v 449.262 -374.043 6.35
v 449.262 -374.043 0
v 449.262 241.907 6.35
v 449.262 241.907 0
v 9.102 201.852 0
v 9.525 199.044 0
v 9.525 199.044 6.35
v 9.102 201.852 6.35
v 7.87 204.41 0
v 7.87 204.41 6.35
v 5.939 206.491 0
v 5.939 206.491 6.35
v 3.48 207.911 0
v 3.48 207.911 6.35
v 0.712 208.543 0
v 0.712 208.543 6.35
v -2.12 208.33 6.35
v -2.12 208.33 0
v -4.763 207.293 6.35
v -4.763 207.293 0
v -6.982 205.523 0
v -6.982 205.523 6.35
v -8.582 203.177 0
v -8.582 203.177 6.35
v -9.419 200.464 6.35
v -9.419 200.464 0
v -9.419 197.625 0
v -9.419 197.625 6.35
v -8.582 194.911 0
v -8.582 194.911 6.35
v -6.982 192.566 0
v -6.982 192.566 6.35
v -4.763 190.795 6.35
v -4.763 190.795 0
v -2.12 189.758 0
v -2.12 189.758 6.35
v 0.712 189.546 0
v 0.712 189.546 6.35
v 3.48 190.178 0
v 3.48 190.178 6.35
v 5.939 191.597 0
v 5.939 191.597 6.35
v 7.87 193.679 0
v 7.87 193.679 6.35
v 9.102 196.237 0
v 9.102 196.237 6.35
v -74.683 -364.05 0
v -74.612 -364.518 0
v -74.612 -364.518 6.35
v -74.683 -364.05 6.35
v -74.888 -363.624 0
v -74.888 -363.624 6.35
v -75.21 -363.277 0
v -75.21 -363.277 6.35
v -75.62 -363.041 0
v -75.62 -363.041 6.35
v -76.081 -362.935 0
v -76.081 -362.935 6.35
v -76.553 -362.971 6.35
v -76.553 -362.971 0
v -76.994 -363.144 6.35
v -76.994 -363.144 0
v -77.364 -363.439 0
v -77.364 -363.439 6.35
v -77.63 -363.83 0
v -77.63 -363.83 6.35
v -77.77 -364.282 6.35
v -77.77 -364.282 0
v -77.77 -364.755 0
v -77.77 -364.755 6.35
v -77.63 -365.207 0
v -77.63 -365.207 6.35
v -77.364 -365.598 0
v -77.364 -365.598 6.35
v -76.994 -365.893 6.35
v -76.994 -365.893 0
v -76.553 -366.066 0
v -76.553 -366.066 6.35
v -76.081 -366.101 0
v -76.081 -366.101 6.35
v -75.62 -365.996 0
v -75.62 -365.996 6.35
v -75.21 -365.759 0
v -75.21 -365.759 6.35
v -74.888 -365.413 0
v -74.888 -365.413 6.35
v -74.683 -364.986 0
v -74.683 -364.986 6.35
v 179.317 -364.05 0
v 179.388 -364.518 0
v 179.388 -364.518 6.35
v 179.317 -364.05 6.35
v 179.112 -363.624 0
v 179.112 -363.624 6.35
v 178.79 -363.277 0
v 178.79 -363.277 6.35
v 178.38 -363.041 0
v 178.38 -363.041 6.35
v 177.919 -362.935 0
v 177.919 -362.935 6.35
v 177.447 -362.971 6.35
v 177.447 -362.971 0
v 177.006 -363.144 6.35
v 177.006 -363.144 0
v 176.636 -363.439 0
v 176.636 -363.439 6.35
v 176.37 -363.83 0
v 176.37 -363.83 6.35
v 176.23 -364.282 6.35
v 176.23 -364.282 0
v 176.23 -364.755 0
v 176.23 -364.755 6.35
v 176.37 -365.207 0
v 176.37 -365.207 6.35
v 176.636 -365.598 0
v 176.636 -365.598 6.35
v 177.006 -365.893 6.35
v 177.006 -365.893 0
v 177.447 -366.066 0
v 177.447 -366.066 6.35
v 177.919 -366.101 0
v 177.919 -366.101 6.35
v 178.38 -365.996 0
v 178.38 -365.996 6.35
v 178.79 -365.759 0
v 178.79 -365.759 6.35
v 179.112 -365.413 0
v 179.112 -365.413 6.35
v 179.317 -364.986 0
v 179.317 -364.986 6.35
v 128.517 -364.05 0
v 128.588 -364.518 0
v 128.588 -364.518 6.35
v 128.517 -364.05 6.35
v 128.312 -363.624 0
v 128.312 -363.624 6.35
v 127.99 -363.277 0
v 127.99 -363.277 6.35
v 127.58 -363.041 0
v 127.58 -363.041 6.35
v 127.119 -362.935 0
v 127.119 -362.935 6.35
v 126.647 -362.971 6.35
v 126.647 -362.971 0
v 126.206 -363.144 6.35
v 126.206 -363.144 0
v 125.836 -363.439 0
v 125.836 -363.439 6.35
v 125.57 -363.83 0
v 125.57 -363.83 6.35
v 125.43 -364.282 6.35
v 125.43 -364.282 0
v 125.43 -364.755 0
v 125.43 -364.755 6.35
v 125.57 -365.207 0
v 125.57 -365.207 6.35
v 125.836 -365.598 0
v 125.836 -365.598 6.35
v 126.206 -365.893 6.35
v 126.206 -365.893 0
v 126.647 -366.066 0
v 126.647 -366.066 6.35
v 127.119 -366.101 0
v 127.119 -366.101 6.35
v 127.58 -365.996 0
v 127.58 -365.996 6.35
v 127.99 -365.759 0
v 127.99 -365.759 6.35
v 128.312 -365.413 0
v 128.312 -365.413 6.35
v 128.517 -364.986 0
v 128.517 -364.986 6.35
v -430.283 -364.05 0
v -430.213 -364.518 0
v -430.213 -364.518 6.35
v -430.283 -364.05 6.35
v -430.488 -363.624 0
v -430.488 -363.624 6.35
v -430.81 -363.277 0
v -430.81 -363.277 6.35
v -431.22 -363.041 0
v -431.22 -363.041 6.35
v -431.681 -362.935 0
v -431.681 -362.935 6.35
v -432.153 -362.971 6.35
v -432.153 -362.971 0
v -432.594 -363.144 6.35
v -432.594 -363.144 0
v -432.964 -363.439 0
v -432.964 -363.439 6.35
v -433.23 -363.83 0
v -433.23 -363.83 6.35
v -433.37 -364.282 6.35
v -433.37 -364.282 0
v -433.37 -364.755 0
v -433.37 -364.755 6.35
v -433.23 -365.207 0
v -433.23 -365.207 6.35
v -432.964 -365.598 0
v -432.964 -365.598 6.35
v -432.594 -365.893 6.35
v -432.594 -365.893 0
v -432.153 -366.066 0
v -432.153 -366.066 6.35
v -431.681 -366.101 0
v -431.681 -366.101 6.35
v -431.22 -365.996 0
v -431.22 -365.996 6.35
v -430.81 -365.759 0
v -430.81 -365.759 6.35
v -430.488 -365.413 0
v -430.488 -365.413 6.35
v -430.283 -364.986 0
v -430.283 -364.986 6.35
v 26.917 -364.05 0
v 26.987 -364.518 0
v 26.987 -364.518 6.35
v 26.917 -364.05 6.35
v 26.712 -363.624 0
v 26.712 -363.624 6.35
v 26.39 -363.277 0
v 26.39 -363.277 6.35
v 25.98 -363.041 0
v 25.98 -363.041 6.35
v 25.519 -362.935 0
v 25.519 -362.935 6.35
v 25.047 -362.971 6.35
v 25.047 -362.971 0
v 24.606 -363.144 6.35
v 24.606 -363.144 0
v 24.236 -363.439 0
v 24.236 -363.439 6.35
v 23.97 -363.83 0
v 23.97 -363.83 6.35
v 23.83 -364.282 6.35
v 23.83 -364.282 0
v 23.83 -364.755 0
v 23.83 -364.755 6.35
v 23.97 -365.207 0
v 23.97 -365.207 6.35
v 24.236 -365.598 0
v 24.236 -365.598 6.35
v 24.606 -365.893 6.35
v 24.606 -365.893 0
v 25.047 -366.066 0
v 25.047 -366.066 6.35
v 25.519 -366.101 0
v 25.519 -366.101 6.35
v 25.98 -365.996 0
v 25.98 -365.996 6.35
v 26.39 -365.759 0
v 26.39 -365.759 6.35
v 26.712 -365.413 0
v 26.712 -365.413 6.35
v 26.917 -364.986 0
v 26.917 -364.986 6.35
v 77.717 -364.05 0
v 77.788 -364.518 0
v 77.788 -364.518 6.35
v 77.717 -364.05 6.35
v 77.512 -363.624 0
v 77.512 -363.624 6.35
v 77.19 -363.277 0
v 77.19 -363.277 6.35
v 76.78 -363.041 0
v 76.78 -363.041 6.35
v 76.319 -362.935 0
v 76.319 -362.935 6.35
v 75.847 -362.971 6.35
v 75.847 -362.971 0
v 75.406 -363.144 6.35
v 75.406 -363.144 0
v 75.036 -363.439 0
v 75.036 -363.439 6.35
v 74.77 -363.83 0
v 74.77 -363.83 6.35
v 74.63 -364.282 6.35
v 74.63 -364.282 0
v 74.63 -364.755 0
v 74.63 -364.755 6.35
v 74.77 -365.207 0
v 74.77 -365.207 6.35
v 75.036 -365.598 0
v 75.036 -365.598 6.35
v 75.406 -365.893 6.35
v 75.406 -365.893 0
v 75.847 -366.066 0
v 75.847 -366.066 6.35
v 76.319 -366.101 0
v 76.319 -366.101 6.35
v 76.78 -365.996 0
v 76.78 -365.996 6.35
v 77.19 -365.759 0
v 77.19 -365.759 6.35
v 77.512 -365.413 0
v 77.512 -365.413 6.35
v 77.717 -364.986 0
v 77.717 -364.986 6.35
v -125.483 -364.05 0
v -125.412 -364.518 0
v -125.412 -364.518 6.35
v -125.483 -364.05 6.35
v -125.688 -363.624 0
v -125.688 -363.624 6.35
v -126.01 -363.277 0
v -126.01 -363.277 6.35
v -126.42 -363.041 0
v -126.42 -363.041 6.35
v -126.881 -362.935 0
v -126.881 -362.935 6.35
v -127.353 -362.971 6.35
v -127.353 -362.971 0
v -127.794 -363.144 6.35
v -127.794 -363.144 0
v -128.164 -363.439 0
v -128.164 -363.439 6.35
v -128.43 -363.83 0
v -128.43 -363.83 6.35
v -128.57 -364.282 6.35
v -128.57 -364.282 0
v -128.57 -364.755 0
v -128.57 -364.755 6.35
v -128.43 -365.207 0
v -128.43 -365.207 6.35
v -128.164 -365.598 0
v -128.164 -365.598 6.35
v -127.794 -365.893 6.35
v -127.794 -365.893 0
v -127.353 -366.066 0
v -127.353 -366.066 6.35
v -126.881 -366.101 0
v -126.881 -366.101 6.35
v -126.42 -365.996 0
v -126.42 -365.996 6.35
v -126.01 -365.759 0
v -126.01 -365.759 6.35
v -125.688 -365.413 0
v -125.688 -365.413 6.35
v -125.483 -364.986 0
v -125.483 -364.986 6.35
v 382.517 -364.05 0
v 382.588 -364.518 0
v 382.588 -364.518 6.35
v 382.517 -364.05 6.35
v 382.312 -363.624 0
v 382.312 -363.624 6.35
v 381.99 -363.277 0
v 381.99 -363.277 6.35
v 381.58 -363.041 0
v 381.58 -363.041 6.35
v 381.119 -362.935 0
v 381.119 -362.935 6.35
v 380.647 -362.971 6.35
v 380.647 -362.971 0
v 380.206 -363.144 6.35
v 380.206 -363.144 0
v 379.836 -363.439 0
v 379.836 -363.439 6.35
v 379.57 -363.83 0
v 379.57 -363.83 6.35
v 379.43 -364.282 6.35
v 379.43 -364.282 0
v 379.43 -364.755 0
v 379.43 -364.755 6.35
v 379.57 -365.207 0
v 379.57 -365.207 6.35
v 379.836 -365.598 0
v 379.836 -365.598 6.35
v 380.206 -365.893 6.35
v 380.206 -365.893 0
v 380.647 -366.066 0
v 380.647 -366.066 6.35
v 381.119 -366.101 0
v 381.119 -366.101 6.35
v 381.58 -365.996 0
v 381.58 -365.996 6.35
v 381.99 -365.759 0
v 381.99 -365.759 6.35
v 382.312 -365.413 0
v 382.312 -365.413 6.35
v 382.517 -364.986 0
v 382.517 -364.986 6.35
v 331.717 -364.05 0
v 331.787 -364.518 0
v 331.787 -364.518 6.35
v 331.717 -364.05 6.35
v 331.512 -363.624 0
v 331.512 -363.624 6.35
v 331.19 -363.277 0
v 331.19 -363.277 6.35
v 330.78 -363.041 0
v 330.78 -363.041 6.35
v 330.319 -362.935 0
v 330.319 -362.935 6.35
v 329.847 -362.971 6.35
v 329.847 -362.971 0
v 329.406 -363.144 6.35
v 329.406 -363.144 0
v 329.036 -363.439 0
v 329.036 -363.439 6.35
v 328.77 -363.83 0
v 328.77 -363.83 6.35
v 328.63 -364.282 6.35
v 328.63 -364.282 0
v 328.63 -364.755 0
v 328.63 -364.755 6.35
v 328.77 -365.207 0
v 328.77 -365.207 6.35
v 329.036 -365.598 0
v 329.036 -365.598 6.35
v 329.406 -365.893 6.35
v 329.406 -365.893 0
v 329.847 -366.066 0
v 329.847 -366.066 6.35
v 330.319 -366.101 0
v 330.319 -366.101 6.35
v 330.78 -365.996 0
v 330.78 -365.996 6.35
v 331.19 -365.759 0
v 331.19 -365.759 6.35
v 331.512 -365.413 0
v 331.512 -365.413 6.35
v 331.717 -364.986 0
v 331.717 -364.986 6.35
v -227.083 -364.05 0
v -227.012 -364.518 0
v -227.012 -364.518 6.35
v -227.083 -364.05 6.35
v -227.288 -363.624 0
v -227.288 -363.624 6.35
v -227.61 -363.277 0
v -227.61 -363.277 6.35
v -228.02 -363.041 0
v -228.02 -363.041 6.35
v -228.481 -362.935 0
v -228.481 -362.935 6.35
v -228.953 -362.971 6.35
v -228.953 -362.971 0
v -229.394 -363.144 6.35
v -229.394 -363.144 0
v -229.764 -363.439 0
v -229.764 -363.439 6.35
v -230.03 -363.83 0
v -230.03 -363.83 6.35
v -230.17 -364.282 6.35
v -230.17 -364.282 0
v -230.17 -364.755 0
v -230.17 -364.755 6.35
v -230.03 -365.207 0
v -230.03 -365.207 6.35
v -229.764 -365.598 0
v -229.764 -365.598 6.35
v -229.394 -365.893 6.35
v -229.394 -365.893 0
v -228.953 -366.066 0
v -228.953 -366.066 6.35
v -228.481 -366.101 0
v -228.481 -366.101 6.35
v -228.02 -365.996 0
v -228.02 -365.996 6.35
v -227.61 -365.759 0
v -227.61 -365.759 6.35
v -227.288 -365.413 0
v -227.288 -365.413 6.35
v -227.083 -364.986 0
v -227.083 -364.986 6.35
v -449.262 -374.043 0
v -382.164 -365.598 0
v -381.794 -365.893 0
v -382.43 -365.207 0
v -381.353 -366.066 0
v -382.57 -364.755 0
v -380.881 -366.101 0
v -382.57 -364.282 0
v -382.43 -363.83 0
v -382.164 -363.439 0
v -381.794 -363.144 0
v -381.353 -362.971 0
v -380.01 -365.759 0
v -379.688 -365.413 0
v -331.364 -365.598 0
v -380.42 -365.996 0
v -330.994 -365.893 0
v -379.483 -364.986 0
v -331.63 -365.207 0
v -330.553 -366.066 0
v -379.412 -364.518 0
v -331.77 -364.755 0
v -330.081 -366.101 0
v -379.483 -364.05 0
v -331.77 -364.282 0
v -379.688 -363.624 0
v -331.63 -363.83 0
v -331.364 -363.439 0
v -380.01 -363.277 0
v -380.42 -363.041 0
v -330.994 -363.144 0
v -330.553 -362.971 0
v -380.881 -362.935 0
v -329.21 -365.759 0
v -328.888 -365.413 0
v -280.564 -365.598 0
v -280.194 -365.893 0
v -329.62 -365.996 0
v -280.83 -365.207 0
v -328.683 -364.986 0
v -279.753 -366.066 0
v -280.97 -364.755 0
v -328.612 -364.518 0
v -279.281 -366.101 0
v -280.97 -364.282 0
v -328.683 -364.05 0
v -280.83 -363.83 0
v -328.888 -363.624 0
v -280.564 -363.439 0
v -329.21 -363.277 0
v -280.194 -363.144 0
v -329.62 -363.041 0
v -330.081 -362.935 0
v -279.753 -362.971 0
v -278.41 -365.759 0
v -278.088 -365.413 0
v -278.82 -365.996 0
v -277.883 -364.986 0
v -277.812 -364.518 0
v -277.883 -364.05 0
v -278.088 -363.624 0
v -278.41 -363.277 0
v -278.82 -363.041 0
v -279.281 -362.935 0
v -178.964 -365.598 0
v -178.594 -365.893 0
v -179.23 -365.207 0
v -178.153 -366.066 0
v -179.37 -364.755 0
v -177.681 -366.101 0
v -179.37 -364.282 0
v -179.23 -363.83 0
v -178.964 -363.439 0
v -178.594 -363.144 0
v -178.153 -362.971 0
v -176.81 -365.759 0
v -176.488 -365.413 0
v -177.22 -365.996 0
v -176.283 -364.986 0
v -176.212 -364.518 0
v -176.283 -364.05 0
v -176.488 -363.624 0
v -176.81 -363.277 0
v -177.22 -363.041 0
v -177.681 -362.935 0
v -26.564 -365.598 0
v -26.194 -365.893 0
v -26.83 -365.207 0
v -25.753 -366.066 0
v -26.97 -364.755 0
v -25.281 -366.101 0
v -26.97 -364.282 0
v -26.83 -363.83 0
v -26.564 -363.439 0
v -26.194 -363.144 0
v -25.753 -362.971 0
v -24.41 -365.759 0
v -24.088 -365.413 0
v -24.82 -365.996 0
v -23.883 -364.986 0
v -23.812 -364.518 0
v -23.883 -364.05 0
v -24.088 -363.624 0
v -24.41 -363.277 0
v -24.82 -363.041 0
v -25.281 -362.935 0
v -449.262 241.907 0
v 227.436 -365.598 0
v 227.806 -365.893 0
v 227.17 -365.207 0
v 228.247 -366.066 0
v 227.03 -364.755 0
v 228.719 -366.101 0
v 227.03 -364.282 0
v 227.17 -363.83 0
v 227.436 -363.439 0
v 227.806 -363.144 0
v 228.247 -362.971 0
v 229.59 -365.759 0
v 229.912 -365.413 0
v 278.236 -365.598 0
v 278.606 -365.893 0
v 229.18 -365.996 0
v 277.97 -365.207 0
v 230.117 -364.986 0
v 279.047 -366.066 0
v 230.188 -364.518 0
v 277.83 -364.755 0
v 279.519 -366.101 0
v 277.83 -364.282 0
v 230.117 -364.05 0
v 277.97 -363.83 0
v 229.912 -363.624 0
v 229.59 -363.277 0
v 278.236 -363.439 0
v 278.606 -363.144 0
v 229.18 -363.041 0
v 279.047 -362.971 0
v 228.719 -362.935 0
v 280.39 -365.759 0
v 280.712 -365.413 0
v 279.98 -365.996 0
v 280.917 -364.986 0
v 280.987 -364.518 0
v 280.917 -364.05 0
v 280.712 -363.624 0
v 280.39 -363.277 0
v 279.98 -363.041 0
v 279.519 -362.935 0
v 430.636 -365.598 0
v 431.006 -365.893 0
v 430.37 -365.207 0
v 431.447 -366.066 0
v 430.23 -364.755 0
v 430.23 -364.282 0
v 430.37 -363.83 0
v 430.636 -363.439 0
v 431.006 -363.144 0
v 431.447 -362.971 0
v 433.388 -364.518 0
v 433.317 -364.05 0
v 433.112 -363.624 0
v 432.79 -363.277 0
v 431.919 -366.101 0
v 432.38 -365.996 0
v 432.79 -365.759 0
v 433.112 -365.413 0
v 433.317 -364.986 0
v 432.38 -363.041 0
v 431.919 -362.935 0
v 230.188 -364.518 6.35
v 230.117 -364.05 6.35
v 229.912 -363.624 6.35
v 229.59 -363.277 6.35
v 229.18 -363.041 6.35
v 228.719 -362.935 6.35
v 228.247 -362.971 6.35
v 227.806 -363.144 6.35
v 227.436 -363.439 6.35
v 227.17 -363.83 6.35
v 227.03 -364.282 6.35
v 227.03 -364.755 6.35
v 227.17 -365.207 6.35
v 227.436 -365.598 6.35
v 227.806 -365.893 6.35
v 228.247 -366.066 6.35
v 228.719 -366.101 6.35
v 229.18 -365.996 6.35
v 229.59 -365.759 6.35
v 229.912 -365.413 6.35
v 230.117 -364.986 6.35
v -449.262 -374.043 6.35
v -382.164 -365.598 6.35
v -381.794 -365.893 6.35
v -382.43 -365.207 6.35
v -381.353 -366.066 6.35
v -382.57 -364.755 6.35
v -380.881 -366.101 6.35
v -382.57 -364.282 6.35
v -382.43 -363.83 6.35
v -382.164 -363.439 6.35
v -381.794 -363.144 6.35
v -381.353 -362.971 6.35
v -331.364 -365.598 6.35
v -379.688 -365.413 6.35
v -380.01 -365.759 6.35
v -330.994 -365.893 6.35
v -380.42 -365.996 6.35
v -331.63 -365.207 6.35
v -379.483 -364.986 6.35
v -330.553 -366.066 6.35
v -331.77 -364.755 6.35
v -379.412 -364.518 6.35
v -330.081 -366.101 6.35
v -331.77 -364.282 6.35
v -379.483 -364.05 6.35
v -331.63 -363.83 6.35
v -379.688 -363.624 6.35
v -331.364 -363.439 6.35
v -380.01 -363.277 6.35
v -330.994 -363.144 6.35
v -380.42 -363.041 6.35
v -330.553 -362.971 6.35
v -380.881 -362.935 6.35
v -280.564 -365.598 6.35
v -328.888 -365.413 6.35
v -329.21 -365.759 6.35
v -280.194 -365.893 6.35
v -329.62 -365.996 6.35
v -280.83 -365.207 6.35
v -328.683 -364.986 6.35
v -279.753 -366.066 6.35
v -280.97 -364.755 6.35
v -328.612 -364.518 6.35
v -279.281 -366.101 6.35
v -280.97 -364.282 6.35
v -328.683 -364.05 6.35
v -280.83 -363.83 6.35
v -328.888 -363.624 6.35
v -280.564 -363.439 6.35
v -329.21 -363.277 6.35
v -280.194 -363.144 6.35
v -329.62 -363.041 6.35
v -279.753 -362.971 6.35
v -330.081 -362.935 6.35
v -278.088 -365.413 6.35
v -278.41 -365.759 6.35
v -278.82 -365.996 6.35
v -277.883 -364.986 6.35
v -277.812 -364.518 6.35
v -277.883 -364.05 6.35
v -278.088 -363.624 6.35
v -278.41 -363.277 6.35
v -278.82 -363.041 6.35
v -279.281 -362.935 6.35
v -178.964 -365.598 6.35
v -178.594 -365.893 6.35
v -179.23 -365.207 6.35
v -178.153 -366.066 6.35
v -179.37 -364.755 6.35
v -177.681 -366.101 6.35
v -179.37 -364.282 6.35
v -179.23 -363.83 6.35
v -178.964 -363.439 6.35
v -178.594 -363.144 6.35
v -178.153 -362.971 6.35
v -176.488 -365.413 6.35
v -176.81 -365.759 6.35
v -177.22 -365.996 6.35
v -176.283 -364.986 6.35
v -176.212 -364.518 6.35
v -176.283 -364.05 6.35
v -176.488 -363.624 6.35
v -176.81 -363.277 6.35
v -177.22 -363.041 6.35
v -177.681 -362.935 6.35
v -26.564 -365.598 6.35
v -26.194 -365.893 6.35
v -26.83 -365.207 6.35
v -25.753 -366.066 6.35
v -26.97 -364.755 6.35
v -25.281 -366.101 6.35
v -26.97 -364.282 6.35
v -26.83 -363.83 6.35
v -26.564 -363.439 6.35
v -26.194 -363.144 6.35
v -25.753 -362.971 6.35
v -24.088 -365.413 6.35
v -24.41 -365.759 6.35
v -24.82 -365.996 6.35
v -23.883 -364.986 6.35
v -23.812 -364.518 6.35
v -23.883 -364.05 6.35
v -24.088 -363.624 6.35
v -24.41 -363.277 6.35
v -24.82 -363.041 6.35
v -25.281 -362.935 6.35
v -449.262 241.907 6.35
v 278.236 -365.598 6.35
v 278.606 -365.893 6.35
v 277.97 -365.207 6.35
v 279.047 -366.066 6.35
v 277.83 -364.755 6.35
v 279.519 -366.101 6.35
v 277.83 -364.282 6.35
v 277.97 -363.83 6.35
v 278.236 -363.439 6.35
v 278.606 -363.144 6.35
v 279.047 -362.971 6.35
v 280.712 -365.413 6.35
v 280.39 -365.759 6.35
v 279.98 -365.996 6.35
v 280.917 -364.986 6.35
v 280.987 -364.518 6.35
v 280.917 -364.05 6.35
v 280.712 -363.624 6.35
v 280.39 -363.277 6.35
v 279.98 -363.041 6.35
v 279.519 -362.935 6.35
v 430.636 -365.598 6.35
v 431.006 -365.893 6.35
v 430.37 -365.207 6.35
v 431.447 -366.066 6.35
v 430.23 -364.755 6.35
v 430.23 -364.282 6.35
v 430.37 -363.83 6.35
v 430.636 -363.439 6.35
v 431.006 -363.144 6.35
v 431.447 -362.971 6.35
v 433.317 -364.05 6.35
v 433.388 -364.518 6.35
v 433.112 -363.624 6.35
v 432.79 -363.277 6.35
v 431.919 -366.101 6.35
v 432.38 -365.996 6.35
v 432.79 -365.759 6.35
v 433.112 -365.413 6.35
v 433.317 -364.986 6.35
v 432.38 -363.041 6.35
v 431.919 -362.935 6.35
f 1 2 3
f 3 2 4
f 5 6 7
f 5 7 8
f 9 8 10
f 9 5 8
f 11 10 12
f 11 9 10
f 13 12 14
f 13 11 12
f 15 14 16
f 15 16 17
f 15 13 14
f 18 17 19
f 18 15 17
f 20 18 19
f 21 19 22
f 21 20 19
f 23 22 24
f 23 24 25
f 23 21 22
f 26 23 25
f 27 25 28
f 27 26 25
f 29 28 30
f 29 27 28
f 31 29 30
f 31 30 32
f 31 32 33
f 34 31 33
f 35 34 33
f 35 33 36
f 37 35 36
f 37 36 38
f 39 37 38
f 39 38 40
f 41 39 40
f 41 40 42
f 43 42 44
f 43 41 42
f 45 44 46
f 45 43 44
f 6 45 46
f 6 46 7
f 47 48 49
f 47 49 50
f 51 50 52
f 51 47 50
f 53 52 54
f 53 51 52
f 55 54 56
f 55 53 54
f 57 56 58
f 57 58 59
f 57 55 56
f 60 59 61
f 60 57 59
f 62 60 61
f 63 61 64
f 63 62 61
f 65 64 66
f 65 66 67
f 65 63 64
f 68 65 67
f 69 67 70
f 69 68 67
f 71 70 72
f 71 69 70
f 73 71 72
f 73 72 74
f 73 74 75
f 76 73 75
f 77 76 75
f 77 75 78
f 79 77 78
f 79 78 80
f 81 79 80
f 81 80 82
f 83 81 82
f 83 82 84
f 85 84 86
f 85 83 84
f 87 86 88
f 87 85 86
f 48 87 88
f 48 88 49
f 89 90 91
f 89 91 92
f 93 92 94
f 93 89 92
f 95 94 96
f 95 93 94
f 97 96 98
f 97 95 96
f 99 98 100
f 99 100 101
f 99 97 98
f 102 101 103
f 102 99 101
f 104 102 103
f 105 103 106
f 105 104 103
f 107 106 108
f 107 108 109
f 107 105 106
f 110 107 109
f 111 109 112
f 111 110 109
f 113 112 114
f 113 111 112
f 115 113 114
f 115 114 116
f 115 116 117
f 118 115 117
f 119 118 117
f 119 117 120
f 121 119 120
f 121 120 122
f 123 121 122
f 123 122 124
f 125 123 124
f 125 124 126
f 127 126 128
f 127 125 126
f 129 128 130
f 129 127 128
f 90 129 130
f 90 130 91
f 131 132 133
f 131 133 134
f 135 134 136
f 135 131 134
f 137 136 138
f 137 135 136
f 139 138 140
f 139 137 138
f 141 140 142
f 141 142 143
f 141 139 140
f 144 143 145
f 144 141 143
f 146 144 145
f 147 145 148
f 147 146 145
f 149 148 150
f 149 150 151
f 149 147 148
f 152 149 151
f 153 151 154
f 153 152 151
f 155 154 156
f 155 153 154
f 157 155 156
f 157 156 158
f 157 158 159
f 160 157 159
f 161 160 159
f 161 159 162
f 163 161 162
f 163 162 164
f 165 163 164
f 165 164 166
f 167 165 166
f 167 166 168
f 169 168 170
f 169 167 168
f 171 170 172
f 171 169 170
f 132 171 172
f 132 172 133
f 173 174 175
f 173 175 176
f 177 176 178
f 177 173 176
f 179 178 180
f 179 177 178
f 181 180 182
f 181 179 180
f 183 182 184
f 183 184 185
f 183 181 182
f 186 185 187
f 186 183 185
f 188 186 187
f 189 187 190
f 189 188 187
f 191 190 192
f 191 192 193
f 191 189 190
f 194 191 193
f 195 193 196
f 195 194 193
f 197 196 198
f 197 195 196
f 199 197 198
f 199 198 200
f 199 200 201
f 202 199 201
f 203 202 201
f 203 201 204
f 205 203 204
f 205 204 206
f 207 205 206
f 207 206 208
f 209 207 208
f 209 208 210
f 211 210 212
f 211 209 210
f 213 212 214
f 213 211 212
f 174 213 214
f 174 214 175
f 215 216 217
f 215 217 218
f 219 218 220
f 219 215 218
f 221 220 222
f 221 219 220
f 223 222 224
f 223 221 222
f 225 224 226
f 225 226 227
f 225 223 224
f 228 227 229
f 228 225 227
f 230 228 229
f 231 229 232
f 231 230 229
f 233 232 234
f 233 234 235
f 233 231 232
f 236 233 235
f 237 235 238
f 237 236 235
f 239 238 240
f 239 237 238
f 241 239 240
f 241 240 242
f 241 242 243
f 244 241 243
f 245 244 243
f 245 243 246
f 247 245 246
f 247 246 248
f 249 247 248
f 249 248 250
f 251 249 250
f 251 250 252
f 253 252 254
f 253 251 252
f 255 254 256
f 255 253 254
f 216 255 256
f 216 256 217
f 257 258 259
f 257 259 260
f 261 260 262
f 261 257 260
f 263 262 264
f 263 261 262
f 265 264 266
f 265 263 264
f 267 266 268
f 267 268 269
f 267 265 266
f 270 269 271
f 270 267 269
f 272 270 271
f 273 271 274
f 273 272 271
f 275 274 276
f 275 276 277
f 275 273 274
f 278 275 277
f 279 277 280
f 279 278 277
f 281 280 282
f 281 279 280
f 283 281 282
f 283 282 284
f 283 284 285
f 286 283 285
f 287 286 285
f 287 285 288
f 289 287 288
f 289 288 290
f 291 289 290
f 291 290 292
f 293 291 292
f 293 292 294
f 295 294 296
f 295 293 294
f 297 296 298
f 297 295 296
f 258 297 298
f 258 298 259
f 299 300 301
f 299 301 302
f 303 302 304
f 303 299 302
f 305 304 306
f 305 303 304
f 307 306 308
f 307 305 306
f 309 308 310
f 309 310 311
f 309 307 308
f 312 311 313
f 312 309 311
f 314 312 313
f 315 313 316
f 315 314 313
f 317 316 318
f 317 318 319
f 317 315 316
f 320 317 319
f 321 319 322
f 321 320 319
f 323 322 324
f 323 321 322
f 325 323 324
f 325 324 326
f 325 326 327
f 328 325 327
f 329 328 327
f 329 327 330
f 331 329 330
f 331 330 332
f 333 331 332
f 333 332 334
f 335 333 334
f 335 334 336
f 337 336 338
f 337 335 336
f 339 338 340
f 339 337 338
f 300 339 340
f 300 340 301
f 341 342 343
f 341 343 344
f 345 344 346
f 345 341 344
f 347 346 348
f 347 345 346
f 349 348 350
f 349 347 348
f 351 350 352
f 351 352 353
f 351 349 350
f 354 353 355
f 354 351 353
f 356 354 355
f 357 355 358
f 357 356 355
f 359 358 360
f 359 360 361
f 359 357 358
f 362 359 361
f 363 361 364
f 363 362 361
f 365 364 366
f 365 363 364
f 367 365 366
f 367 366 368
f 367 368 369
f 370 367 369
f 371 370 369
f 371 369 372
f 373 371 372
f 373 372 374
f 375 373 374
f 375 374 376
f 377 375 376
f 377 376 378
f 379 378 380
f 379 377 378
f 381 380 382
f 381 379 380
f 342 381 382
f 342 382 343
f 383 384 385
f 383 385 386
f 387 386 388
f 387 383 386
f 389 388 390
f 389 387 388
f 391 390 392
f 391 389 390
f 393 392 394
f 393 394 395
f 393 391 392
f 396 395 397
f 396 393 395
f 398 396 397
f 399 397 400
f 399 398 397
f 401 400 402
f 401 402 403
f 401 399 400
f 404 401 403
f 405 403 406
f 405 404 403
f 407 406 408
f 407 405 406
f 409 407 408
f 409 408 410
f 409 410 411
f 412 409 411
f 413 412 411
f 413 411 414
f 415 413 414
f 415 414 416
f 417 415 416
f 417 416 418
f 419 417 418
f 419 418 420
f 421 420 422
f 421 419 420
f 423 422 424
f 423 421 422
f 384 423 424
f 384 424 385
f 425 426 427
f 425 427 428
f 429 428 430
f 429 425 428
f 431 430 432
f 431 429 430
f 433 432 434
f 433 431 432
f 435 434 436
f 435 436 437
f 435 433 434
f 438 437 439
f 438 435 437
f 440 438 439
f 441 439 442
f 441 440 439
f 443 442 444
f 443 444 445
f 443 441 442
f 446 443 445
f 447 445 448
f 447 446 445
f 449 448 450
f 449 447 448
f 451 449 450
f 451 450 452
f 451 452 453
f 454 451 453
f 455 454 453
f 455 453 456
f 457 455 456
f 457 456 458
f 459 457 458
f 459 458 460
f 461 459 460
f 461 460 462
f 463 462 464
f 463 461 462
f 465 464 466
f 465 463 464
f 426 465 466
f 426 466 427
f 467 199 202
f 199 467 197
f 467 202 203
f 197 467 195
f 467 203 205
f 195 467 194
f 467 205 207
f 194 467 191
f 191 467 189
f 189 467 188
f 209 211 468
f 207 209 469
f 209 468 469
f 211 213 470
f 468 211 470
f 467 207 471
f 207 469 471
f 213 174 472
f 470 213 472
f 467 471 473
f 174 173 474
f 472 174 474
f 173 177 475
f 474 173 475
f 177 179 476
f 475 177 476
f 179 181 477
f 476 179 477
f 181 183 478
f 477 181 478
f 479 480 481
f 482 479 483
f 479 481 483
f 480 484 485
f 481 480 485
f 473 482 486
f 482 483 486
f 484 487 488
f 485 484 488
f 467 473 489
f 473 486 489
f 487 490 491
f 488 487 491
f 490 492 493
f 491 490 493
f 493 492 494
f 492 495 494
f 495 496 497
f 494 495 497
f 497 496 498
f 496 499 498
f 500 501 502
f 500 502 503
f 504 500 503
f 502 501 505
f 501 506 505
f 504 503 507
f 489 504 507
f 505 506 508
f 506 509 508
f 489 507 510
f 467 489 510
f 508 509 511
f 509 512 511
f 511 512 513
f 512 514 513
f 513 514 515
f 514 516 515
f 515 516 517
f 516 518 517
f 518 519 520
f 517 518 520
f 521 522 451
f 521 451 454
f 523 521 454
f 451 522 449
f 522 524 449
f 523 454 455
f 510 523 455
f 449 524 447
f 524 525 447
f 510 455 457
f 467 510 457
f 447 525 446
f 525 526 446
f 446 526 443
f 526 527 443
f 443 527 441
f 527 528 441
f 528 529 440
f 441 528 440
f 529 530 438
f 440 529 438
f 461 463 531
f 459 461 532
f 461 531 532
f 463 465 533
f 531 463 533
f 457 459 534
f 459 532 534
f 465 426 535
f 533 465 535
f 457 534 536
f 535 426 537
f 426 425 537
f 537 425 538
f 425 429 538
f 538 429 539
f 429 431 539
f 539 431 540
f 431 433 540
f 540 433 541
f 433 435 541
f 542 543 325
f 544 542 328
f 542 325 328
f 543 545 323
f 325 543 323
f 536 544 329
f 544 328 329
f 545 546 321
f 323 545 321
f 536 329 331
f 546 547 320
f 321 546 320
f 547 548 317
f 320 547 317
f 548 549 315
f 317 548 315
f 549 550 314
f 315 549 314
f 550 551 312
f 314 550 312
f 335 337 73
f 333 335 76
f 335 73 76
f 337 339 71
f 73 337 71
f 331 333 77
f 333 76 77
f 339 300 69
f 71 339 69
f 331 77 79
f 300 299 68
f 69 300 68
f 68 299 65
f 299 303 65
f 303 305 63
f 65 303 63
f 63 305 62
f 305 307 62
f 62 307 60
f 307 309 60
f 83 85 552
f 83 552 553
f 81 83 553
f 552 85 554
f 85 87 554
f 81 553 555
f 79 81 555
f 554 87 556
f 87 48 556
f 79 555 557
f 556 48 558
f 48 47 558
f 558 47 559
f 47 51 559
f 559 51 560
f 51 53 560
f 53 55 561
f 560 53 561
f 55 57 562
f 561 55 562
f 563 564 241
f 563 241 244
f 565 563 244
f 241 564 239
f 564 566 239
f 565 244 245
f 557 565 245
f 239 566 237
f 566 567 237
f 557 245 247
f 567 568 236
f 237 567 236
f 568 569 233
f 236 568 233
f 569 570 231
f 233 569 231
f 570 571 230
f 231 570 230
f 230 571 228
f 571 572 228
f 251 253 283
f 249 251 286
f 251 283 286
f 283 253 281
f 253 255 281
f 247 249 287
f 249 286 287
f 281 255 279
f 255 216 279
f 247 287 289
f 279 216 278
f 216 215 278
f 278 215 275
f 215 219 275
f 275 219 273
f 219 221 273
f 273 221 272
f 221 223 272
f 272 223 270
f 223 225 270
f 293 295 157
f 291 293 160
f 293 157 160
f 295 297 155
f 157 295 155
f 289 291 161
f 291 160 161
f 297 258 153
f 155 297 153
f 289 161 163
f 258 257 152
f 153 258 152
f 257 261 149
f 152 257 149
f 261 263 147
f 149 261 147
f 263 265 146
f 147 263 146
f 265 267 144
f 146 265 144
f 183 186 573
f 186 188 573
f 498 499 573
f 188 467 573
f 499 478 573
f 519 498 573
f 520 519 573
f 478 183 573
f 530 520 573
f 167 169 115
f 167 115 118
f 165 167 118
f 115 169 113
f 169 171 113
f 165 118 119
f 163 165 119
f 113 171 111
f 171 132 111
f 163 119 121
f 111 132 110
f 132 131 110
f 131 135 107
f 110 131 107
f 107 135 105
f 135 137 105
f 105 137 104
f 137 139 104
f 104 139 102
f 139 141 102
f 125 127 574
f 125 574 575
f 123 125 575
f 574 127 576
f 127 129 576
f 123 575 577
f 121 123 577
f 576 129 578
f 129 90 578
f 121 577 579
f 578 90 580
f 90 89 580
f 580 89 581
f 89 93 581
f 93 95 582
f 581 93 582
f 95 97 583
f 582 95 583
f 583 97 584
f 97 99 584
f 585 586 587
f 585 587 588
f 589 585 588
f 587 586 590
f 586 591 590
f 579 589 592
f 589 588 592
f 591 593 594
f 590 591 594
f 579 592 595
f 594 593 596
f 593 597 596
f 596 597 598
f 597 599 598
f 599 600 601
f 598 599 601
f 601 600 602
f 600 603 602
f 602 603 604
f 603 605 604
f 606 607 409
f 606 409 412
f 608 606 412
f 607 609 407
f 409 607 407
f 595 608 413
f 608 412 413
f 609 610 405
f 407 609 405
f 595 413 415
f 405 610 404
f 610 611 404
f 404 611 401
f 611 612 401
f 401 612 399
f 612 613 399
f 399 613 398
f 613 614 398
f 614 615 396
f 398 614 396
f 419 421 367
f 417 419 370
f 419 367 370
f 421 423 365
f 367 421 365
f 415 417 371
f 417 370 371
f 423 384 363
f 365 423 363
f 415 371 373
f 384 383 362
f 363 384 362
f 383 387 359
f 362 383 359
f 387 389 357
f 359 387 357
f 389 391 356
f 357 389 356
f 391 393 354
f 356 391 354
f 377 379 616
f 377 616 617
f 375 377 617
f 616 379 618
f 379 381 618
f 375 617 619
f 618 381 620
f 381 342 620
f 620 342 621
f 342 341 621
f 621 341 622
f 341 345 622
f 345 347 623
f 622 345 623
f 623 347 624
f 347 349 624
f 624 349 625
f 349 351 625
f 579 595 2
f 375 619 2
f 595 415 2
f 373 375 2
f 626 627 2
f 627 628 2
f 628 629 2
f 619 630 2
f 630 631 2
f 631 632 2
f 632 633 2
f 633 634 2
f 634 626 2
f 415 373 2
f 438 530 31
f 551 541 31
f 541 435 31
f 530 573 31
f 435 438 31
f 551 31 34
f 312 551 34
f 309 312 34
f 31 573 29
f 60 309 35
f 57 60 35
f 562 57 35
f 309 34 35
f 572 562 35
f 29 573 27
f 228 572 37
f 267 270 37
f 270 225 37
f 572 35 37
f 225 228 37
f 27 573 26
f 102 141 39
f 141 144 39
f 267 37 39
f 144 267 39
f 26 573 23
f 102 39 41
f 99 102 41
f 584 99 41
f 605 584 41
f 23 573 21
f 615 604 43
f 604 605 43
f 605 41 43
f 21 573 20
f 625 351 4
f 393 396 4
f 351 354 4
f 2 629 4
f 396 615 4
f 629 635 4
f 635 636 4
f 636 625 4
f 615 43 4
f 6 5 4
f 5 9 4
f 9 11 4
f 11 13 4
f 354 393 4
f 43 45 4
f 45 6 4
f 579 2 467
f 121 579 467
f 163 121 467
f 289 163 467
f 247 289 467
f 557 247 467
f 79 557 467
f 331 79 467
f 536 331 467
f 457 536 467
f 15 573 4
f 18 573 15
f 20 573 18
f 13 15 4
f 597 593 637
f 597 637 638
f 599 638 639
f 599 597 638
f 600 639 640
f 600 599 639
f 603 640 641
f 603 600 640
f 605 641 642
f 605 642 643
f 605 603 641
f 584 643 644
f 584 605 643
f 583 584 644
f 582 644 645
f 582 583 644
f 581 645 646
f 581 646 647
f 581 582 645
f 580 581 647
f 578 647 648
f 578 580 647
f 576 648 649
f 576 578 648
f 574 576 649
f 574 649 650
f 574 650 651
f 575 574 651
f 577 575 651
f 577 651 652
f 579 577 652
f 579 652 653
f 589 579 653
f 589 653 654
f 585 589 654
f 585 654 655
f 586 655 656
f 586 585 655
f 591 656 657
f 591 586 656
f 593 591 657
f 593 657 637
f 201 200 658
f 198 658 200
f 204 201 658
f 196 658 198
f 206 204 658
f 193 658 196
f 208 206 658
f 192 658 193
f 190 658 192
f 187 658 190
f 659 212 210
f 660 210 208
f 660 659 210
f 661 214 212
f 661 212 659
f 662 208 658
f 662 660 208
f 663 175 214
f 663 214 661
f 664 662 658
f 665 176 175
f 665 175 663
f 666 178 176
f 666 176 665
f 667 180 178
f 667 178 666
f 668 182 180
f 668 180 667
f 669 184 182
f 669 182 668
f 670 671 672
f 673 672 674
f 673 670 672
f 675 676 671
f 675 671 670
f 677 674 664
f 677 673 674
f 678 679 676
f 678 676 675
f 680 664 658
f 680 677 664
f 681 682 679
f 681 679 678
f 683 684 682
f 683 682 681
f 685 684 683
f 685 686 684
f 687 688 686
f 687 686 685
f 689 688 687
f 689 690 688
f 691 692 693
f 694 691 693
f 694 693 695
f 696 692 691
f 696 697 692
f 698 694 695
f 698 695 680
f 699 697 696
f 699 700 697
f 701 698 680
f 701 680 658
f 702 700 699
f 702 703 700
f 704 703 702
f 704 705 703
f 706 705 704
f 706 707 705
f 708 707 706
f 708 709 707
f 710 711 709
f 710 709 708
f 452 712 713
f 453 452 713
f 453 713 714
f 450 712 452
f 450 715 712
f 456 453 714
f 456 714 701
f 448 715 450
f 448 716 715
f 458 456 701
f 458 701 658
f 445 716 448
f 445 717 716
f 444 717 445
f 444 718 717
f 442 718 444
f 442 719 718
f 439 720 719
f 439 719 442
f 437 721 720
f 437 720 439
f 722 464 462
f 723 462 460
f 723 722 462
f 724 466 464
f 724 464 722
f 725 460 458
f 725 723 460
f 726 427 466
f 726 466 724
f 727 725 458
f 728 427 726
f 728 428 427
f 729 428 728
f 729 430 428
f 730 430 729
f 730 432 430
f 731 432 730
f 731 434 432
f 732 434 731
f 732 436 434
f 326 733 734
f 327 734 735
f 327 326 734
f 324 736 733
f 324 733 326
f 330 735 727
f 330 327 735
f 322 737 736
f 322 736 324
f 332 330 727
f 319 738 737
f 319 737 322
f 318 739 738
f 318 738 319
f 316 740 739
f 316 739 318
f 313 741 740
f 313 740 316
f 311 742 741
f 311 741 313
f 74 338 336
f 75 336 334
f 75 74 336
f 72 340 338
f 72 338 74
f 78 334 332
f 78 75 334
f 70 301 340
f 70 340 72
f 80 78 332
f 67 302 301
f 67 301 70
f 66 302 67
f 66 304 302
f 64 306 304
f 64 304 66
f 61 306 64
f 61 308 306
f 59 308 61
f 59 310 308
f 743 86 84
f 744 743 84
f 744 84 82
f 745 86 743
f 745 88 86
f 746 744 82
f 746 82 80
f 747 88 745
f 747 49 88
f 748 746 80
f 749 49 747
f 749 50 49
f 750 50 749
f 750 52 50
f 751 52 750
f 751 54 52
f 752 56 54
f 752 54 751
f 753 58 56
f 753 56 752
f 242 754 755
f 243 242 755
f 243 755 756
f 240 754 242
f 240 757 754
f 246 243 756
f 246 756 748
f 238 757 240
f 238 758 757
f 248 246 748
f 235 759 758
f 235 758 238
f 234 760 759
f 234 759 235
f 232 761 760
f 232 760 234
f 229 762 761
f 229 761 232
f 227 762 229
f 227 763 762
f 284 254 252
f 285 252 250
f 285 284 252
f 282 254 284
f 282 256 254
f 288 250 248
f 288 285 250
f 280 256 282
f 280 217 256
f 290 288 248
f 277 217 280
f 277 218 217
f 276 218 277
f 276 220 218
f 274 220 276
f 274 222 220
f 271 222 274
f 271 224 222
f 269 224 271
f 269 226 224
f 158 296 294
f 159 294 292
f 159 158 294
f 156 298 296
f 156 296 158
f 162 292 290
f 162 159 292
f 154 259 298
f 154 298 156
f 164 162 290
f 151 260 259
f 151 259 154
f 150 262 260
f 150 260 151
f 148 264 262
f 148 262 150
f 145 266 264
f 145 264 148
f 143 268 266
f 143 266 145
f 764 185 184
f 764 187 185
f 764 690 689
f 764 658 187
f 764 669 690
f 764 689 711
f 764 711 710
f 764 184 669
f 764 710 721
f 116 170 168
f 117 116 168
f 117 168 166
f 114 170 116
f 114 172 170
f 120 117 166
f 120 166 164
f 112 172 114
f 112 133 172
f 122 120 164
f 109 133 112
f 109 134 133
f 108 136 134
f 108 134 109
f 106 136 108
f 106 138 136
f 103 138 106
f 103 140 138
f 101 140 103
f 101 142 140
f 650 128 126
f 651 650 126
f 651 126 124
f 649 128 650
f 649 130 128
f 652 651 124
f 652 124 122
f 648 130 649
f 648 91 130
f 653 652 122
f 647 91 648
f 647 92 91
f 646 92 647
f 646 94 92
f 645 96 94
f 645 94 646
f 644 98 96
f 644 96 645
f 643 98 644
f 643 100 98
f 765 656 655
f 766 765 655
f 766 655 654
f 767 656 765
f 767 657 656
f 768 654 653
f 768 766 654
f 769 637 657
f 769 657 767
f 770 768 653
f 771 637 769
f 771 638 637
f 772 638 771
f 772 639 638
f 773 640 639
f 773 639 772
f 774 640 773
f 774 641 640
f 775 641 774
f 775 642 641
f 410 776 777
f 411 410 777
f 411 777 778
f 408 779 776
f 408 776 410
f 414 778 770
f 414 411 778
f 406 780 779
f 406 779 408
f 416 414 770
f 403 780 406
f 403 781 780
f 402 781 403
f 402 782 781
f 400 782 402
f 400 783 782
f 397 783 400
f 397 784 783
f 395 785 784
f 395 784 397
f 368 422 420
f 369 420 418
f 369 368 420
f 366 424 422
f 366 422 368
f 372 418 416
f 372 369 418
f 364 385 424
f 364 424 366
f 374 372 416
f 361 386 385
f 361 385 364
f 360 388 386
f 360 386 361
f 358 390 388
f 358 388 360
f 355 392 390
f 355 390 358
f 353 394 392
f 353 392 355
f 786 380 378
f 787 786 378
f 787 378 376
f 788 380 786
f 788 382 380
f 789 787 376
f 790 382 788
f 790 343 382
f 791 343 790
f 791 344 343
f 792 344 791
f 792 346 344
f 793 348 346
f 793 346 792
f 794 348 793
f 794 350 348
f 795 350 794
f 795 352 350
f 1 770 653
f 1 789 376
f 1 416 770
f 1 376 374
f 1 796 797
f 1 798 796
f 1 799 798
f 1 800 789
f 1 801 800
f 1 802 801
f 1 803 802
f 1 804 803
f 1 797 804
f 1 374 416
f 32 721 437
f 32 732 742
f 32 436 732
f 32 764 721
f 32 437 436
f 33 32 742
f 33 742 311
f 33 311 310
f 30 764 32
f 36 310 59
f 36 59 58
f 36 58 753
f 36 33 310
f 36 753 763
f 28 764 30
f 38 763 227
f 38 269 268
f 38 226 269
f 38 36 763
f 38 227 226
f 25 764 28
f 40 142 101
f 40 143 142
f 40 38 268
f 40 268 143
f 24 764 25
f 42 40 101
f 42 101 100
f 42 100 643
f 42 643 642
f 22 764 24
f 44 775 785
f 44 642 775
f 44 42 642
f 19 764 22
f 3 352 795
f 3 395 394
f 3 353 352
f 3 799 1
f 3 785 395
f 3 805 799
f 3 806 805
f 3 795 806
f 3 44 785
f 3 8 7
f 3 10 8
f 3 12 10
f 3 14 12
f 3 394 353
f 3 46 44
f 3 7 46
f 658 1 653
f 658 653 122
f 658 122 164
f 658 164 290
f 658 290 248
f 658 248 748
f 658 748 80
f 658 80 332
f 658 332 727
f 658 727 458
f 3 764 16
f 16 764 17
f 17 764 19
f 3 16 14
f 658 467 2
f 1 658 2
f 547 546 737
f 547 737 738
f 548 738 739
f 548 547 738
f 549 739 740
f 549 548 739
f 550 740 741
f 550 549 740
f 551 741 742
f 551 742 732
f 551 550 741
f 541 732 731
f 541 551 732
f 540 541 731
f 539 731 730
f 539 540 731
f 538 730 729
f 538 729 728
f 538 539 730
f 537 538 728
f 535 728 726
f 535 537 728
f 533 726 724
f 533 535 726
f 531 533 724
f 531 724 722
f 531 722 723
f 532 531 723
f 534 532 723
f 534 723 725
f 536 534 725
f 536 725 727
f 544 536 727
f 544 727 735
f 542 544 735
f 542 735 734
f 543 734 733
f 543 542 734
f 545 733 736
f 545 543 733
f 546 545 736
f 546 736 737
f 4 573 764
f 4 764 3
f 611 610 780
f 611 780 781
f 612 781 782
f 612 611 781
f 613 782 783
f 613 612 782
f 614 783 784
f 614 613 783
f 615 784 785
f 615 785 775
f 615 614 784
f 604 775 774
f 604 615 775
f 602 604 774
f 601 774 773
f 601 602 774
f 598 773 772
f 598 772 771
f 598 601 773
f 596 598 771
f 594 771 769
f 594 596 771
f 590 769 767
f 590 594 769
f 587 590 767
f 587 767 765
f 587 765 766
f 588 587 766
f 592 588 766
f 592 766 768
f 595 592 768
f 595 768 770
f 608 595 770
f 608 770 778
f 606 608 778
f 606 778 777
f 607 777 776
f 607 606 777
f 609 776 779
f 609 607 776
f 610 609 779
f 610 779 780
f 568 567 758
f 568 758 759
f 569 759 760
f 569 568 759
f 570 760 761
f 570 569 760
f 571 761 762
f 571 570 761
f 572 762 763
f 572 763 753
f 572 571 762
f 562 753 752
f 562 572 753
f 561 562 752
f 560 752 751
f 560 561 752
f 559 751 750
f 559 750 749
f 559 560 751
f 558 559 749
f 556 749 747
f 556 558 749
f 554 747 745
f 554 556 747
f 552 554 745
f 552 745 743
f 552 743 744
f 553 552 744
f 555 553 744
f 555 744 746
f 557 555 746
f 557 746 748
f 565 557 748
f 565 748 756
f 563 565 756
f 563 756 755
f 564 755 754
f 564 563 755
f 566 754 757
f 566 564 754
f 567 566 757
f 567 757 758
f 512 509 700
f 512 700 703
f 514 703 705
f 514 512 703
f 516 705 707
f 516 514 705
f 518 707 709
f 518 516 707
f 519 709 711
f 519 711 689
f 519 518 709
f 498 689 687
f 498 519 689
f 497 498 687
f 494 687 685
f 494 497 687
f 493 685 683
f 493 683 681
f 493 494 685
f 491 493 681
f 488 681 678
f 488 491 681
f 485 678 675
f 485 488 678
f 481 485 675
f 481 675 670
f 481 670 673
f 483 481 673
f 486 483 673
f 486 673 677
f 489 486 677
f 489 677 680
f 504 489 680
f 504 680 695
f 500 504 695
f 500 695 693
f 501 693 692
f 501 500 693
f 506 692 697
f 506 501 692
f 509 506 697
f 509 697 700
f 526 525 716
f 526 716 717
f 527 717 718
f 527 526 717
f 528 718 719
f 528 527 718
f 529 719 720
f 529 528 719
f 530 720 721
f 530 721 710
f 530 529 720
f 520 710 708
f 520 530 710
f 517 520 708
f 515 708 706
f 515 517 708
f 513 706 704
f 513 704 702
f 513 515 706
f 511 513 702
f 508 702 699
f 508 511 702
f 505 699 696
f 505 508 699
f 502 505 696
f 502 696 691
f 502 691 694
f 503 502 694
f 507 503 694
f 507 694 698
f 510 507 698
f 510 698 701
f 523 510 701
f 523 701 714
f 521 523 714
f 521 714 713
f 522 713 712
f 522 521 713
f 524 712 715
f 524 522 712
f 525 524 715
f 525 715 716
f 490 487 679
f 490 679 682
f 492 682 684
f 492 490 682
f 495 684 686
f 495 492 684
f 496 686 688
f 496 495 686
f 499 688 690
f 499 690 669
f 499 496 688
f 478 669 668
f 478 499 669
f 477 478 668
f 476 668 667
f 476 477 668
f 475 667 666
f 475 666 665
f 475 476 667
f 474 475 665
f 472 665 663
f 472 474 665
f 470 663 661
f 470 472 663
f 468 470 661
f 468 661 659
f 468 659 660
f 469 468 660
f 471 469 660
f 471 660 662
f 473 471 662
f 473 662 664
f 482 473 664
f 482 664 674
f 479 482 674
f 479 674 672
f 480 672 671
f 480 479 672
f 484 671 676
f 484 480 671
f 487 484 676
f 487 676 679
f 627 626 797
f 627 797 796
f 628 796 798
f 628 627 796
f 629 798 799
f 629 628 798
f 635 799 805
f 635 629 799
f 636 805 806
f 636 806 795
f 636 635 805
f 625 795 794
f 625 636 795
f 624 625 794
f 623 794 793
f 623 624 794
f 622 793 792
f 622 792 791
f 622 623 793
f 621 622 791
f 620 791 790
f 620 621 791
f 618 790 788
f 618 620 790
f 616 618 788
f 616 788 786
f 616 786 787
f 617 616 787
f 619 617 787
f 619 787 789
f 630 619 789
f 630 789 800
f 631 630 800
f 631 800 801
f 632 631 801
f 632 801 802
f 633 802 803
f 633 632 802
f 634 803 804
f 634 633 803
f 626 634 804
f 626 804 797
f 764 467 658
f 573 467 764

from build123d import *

# Parameters (mm, degrees)
F0_W     = 898.525
F0_H     = 615.95
F0_R     = 1.5875
F0_R_2   = 9.525
F1_DEPTH = 6.35


with BuildPart() as f1:
    # F0 (on Top) → F1 (new body)
    with BuildSketch(Plane.XY):
        with Locations((0, -66.068323)):
            Rectangle(F0_W, F0_H)
        with Locations((-431.8, -364.518323)):
            Circle(F0_R, mode=Mode.SUBTRACT)
        with Locations((-381, -364.518323)):
            Circle(F0_R, mode=Mode.SUBTRACT)
        with Locations((-330.2, -364.518323)):
            Circle(F0_R, mode=Mode.SUBTRACT)
        with Locations((-279.4, -364.518323)):
            Circle(F0_R, mode=Mode.SUBTRACT)
        with Locations((-228.6, -364.518323)):
            Circle(F0_R, mode=Mode.SUBTRACT)
        with Locations((-177.8, -364.518323)):
            Circle(F0_R, mode=Mode.SUBTRACT)
        with Locations((-127, -364.518323)):
            Circle(F0_R, mode=Mode.SUBTRACT)
        with Locations((-76.2, -364.518323)):
            Circle(F0_R, mode=Mode.SUBTRACT)
        with Locations((-25.4, -364.518323)):
            Circle(F0_R, mode=Mode.SUBTRACT)
        with Locations((25.4, -364.518323)):
            Circle(F0_R, mode=Mode.SUBTRACT)
        with Locations((76.2, -364.518323)):
            Circle(F0_R, mode=Mode.SUBTRACT)
        with Locations((127, -364.518323)):
            Circle(F0_R, mode=Mode.SUBTRACT)
        with Locations((177.8, -364.518323)):
            Circle(F0_R, mode=Mode.SUBTRACT)
        with Locations((228.6, -364.518323)):
            Circle(F0_R, mode=Mode.SUBTRACT)
        with Locations((279.4, -364.518323)):
            Circle(F0_R, mode=Mode.SUBTRACT)
        with Locations((330.2, -364.518323)):
            Circle(F0_R, mode=Mode.SUBTRACT)
        with Locations((381, -364.518323)):
            Circle(F0_R, mode=Mode.SUBTRACT)
        with Locations((431.8, -364.518323)):
            Circle(F0_R, mode=Mode.SUBTRACT)
        with Locations((0, 199.044177)):
            Circle(F0_R_2, mode=Mode.SUBTRACT)
    extrude(amount=F1_DEPTH)


solid = f1.part
